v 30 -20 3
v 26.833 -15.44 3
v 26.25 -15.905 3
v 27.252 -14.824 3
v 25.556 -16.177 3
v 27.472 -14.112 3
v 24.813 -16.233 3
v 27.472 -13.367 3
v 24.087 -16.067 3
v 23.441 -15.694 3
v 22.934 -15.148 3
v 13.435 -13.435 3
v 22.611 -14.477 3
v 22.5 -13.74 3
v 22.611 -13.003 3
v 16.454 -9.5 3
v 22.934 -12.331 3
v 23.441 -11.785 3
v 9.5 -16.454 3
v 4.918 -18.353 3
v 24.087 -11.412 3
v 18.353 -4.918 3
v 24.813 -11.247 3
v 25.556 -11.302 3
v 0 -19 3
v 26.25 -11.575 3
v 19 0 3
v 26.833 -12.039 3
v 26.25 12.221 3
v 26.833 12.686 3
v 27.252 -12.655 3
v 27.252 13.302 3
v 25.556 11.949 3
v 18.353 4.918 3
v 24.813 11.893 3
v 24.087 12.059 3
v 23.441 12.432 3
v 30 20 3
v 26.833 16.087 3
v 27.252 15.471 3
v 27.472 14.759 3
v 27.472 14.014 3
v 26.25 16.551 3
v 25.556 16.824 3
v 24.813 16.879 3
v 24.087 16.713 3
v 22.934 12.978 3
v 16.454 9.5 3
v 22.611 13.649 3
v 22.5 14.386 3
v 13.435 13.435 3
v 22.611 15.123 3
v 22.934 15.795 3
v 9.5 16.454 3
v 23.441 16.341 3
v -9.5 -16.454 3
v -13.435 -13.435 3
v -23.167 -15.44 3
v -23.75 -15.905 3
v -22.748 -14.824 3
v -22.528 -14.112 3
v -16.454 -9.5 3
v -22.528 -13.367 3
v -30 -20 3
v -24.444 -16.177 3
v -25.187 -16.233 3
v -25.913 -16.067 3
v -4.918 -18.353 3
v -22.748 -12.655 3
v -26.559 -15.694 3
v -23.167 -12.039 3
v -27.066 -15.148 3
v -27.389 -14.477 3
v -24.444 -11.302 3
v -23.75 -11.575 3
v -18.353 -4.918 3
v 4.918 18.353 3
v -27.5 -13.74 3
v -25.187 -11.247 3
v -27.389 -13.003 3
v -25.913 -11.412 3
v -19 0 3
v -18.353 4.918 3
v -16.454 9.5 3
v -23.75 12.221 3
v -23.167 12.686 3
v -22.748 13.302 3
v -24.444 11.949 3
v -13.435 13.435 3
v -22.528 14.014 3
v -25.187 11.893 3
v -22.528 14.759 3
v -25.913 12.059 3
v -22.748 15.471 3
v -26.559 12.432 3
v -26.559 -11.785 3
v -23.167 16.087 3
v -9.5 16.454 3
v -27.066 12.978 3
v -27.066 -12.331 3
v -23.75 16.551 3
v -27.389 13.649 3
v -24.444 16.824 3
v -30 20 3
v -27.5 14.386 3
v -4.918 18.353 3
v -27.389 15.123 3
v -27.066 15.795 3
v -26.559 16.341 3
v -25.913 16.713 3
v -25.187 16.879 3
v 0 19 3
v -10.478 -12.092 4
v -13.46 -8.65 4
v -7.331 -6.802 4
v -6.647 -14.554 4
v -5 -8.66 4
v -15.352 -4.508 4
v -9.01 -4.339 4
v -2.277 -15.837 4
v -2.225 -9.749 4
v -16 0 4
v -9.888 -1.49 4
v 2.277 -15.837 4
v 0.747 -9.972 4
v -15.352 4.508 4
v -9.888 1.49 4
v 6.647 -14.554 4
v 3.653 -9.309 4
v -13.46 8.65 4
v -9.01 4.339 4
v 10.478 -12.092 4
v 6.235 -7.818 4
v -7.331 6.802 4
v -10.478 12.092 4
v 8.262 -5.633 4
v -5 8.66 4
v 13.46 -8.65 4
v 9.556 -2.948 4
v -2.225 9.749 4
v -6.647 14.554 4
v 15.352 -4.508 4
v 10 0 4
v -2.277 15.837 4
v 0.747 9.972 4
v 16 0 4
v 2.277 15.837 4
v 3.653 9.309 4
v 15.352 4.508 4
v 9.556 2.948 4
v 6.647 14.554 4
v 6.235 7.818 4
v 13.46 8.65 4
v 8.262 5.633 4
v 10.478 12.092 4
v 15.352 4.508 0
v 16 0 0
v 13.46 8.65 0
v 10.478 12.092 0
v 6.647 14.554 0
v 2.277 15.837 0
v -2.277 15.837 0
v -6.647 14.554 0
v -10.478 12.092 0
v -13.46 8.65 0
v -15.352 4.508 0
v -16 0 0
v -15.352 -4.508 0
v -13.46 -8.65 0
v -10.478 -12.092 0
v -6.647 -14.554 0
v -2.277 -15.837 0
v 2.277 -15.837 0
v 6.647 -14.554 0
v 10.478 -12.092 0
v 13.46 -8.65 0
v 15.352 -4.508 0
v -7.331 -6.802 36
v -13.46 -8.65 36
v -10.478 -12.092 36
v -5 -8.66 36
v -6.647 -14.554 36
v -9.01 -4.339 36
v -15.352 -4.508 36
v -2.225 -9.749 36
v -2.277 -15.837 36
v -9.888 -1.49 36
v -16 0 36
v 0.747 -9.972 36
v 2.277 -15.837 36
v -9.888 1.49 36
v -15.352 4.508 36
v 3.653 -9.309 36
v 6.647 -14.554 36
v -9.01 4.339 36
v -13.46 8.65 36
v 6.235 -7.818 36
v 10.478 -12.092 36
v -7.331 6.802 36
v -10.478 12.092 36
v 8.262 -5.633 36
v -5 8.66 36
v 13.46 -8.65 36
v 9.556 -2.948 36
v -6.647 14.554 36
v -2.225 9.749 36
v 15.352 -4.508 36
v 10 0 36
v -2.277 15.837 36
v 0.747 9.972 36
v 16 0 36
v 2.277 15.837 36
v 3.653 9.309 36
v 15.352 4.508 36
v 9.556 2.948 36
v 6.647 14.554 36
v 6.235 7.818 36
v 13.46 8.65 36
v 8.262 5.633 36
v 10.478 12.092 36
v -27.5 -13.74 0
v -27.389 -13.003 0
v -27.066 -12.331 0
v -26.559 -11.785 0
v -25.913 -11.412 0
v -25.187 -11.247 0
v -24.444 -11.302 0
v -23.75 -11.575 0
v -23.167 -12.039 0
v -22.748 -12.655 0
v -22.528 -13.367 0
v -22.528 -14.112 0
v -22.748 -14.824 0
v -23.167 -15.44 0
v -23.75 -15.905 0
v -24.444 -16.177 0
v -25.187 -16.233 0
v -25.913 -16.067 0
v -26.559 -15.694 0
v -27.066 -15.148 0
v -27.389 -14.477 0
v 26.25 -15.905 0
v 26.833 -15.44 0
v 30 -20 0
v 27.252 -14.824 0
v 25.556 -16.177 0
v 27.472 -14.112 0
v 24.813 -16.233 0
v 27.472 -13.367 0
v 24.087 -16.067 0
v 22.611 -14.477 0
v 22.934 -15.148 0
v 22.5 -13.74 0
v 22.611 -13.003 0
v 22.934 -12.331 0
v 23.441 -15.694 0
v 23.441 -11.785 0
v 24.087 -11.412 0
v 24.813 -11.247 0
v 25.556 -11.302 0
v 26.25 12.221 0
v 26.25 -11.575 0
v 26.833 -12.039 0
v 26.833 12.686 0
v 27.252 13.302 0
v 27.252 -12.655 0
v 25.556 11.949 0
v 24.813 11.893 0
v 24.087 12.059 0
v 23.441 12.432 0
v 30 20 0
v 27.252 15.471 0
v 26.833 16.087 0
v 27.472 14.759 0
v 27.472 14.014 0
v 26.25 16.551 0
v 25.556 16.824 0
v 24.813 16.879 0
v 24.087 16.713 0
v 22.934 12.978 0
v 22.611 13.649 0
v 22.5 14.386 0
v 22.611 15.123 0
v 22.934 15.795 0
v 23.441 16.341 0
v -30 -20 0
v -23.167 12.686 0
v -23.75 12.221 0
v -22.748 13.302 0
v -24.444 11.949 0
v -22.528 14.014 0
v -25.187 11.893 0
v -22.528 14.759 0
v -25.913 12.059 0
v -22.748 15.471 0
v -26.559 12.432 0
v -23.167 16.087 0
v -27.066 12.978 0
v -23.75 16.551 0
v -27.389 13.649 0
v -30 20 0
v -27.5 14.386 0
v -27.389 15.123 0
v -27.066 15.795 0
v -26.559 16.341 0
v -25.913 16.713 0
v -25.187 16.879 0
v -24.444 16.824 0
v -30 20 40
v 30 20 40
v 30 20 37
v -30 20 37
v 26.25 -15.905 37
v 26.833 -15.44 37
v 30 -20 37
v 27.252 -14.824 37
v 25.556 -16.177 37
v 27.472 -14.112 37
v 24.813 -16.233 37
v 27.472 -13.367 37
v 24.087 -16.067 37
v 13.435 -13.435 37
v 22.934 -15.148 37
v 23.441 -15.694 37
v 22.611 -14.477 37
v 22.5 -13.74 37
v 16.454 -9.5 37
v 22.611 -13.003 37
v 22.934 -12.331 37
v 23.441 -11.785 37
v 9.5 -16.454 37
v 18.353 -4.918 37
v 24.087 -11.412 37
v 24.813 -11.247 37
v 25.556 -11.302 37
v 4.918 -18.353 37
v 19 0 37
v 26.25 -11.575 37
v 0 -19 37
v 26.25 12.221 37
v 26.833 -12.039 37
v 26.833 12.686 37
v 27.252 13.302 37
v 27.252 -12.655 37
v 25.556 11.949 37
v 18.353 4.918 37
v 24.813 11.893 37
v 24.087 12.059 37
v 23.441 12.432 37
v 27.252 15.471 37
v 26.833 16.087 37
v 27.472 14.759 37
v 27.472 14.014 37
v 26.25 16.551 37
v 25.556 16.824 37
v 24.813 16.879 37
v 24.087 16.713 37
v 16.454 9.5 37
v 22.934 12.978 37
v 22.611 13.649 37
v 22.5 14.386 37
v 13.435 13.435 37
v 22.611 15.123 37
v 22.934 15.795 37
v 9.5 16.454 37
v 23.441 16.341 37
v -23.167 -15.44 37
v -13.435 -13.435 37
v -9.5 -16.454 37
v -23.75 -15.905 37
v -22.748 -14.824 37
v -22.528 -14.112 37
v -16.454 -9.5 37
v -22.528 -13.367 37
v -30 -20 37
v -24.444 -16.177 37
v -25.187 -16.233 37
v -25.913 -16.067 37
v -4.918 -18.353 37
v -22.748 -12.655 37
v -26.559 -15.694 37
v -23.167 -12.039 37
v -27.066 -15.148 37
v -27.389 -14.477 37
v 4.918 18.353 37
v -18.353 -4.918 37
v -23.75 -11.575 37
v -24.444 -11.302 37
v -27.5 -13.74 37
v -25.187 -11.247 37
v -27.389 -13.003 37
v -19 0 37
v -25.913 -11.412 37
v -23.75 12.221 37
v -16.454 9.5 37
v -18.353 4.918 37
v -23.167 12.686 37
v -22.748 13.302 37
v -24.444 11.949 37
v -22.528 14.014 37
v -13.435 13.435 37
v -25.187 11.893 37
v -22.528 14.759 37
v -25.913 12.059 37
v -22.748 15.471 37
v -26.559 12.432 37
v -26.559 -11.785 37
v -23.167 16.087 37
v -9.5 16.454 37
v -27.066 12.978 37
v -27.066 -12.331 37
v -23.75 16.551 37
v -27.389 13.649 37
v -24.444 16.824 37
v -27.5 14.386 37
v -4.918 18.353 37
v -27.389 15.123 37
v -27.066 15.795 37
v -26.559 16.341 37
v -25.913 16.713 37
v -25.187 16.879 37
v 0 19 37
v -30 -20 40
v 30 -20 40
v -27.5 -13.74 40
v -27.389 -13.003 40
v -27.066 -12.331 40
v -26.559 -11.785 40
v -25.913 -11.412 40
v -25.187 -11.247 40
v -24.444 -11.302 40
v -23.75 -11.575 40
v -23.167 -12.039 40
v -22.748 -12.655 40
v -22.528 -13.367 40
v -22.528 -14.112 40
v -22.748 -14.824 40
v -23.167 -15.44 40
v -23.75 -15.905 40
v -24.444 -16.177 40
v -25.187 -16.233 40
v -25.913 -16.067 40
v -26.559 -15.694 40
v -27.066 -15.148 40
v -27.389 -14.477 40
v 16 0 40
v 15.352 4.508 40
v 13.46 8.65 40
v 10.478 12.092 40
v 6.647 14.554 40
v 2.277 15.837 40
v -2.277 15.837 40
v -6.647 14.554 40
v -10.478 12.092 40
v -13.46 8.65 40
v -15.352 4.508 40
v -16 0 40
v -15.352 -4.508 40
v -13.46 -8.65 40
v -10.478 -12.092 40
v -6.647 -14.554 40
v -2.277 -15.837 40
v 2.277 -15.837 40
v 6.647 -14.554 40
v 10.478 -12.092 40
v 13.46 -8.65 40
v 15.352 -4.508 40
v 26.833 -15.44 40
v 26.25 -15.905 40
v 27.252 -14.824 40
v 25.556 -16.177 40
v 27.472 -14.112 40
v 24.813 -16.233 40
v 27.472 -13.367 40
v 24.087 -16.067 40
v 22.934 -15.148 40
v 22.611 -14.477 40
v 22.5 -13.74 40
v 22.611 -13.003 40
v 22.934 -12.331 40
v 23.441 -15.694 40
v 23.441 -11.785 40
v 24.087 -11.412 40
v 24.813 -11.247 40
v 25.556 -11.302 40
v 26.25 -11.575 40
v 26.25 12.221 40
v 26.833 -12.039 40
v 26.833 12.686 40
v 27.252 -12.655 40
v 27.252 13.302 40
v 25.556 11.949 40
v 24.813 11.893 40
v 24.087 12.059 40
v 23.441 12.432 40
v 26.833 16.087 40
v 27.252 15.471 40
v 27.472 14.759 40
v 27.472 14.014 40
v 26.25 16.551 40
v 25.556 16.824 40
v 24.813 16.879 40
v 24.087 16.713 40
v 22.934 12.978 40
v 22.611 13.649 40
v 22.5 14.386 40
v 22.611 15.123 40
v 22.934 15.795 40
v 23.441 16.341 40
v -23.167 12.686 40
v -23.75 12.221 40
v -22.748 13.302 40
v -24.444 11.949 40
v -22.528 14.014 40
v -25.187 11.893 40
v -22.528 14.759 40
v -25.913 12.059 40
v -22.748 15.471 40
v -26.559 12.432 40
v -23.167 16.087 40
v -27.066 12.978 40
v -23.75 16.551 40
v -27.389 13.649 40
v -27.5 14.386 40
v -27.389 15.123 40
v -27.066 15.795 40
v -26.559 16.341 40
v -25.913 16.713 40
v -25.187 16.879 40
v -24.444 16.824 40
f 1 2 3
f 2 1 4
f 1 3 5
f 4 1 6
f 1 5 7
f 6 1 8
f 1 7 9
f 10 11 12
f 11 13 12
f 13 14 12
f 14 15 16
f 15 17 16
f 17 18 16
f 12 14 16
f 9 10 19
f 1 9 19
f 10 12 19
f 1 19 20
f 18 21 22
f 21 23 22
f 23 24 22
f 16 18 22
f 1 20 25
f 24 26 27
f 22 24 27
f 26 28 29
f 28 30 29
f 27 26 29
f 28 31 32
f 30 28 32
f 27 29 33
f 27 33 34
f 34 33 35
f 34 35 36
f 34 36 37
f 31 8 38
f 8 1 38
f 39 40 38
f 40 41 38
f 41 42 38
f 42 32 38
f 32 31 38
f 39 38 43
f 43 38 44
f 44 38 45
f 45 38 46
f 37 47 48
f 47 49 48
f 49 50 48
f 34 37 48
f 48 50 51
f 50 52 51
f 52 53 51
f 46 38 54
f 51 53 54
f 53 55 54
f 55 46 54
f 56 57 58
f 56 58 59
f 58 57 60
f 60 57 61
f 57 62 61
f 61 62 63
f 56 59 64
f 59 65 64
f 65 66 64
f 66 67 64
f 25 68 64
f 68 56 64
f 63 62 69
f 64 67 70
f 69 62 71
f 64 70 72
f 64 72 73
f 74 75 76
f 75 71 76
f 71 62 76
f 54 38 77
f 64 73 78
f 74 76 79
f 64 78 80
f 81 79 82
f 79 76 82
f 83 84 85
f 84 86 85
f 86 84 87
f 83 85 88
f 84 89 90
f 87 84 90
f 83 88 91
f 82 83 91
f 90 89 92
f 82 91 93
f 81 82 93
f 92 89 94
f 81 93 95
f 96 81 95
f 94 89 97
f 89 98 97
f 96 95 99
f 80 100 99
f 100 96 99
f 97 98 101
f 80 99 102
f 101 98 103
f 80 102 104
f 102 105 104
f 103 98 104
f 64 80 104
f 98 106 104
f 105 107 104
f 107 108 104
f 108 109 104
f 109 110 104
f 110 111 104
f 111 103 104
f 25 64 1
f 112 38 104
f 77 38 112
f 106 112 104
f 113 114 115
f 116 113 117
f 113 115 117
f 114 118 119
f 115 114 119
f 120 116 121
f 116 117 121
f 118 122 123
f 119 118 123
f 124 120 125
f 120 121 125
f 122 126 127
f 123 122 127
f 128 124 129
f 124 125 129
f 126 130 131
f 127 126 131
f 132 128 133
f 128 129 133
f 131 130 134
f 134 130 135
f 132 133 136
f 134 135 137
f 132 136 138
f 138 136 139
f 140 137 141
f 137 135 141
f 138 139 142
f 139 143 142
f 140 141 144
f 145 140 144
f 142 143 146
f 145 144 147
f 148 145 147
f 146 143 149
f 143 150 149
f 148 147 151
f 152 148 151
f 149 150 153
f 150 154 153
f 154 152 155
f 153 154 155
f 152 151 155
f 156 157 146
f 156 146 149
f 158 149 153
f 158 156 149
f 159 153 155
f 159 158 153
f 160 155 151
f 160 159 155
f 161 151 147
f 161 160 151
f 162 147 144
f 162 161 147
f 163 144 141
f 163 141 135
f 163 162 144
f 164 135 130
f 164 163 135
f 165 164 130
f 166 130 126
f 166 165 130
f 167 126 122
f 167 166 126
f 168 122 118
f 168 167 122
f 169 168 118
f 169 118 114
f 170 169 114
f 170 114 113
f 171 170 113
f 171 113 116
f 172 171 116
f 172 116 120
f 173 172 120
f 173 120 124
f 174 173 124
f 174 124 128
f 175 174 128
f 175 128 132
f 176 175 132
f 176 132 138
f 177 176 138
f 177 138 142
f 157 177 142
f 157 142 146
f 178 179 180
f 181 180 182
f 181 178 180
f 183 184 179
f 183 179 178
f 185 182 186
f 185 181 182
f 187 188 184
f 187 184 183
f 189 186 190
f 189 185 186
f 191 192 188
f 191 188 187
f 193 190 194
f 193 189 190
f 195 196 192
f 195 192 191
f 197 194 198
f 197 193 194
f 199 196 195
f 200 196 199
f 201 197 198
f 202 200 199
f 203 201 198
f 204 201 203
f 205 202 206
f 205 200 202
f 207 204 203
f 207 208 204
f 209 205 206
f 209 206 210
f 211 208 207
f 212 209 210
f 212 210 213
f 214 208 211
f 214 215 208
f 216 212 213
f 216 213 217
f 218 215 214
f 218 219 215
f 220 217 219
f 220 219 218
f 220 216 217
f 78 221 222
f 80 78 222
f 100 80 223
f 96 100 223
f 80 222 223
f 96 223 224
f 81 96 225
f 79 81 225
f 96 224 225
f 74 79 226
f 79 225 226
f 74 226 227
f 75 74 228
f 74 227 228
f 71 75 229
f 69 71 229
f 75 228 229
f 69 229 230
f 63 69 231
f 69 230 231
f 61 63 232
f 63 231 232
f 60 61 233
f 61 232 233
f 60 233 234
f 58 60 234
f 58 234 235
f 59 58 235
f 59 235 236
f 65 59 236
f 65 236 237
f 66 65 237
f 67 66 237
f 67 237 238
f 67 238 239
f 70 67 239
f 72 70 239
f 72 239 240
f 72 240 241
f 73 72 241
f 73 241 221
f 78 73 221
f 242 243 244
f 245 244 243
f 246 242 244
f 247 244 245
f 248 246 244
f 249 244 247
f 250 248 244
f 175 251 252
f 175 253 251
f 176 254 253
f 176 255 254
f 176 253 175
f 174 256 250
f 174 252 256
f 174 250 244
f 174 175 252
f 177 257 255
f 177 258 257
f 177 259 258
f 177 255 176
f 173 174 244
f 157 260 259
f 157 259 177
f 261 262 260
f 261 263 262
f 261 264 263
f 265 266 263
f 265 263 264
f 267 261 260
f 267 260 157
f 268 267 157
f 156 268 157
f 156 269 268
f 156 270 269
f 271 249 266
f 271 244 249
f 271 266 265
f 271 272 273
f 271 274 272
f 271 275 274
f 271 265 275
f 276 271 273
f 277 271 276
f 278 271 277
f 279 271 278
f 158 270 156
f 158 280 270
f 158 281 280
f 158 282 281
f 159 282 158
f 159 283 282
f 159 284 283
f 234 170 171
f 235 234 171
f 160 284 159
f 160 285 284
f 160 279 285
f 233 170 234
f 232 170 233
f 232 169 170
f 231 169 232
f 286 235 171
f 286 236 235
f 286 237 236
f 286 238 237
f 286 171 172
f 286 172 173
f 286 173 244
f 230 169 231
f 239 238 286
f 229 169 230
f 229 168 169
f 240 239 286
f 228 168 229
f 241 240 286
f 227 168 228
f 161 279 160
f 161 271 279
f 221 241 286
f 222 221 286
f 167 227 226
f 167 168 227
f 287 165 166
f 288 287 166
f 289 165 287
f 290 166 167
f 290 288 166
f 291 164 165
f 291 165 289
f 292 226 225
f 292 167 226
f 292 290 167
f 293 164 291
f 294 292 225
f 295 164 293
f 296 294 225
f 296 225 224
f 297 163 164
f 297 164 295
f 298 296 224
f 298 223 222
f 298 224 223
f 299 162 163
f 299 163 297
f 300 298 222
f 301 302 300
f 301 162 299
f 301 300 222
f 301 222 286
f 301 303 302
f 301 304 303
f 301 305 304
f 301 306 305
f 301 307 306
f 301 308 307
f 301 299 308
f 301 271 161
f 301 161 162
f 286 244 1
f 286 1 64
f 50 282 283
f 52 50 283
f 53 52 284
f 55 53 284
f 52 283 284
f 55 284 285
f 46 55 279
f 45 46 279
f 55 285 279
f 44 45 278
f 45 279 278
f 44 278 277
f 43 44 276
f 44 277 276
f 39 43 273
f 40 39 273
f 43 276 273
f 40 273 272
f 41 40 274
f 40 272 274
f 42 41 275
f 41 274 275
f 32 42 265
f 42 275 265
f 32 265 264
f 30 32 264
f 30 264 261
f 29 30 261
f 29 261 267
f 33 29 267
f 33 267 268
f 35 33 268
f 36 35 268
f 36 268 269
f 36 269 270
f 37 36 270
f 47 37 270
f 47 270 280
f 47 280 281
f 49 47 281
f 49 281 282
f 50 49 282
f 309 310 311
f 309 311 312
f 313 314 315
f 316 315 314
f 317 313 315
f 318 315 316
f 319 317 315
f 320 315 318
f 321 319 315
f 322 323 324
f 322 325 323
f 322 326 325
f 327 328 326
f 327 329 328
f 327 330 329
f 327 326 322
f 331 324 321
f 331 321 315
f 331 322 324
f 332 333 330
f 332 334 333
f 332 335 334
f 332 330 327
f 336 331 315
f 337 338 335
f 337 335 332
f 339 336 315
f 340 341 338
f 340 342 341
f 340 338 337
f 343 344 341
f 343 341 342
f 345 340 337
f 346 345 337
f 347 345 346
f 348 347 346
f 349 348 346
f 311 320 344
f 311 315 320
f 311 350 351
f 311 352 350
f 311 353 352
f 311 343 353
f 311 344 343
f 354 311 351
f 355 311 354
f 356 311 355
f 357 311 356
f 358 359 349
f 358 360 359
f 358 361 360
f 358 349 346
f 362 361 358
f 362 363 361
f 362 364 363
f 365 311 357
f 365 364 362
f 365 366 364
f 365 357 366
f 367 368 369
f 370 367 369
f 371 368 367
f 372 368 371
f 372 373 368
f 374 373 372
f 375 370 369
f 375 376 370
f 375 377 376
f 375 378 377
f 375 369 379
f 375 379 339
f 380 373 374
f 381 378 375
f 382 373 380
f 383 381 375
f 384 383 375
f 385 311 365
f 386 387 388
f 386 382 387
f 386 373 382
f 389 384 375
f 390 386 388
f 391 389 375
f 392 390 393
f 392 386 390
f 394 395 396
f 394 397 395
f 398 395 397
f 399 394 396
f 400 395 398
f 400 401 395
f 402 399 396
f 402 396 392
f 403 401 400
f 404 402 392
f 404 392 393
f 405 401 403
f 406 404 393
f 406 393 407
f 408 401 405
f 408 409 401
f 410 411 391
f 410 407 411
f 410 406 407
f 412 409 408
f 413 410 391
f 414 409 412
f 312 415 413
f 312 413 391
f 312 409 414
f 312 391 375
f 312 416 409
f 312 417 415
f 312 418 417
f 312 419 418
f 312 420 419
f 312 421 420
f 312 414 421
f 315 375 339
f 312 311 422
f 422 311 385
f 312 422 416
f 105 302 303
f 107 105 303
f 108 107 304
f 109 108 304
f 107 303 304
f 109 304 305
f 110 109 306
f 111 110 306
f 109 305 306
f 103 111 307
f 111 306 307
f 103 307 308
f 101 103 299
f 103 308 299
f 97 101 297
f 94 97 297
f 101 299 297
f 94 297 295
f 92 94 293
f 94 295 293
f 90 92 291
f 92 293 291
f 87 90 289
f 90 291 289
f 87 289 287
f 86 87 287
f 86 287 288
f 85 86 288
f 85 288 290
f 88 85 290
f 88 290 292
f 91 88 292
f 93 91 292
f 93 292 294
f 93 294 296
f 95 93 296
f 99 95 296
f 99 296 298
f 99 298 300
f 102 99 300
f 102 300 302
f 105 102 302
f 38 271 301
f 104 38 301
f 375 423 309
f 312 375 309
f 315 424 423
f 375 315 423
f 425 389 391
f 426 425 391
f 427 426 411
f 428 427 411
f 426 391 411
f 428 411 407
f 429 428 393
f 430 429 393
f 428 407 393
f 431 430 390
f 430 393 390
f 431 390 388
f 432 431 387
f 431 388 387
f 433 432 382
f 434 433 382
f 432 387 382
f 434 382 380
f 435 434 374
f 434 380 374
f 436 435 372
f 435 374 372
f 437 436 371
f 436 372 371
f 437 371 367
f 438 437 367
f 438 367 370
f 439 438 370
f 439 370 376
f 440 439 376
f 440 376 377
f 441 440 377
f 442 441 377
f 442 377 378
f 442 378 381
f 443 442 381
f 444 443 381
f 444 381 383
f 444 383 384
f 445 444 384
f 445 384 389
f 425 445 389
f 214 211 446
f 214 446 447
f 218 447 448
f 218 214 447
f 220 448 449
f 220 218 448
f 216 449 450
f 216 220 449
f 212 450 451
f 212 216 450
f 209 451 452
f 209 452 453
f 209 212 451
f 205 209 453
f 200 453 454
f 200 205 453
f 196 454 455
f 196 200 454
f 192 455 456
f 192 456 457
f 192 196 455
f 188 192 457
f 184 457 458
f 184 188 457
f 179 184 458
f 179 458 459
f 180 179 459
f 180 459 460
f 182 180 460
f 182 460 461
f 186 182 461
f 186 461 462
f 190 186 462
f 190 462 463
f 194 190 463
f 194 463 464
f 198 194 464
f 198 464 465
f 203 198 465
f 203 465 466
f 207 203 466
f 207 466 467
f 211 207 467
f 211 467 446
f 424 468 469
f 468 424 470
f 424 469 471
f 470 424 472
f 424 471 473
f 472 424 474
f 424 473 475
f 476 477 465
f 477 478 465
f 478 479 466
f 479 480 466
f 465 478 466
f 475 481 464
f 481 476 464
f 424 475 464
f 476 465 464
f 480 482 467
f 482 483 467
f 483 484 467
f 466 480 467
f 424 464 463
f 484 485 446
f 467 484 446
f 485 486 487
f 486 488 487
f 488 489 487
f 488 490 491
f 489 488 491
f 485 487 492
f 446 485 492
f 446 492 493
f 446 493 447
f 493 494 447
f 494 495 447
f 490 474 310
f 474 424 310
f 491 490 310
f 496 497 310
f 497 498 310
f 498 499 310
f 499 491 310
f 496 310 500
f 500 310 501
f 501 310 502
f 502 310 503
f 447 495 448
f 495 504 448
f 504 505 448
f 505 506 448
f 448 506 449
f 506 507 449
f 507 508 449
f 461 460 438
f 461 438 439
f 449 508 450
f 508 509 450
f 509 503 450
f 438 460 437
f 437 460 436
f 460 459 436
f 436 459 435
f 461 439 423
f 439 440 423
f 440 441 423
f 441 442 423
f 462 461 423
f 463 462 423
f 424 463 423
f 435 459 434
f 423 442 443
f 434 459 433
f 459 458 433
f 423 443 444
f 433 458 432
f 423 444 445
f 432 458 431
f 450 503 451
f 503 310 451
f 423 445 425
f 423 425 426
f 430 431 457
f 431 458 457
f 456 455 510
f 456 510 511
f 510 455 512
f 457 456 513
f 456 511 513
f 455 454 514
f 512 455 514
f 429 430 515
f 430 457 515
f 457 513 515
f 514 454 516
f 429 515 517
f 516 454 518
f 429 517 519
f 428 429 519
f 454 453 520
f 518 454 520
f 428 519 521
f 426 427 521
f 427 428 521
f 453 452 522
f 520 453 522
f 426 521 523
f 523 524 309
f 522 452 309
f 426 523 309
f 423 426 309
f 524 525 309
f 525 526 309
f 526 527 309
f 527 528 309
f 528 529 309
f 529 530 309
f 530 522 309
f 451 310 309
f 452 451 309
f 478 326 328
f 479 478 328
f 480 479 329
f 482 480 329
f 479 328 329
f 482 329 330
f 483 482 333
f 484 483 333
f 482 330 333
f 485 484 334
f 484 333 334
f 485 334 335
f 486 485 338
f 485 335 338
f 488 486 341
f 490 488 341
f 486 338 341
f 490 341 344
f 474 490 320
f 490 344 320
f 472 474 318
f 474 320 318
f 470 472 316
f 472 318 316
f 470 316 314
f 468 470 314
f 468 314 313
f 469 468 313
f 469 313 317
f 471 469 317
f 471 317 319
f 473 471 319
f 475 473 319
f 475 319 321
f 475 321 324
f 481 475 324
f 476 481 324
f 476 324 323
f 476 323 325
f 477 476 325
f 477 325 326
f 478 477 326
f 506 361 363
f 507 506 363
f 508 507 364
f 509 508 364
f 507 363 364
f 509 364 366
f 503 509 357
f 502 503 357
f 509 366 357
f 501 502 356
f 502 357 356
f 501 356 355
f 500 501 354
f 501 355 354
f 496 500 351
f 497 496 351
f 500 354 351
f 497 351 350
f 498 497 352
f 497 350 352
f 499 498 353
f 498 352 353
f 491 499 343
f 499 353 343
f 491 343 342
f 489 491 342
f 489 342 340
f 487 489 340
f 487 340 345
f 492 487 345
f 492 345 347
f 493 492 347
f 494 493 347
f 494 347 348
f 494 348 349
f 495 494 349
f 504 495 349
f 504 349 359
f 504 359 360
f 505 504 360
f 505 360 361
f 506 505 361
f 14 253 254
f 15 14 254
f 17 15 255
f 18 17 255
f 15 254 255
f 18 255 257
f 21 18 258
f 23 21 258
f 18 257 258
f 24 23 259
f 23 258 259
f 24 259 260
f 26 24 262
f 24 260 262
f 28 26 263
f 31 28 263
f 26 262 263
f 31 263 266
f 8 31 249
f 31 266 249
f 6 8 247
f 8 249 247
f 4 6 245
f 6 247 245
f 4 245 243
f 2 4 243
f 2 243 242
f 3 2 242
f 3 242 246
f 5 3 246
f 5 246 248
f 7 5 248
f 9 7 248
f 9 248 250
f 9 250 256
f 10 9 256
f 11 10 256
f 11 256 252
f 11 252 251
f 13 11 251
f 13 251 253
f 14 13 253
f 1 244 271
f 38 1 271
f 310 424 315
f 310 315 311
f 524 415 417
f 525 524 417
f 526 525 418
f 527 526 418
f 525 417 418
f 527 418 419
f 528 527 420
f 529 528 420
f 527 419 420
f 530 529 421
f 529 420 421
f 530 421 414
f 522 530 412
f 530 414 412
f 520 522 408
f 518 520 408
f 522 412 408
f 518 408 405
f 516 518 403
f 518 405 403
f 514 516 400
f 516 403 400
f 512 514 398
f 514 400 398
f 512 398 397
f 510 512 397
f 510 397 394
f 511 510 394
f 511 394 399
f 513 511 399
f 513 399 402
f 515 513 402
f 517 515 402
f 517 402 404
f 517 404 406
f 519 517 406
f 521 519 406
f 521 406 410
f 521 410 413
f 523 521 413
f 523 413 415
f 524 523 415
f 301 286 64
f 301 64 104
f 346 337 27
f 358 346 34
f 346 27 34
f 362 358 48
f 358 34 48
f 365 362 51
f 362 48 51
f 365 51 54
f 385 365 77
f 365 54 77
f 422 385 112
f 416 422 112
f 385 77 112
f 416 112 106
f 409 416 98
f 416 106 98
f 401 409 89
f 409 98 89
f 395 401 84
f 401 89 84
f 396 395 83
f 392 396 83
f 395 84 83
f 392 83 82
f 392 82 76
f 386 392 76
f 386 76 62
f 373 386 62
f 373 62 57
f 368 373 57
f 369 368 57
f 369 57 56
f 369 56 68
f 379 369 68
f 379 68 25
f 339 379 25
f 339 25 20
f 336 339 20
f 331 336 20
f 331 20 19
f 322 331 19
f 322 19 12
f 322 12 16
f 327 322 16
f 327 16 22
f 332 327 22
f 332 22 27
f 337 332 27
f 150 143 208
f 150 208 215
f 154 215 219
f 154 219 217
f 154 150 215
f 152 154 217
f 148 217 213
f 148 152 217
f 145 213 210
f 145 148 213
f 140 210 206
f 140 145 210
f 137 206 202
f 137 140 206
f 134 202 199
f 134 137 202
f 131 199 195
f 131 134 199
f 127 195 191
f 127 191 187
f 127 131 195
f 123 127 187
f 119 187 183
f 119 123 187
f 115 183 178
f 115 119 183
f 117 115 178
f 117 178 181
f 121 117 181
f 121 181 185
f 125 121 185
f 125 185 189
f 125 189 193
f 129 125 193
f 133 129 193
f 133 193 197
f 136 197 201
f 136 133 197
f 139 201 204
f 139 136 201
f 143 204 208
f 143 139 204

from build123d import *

# Parameters (mm, degrees)
SKETCH1_R                = 19
SKETCH1_R_2              = 16
BOSS_EXTRUDE1_DEPTH      = 40
SKETCH2_W                = 60
SKETCH2_H                = 40
SKETCH2_R                = 19
BOSS_EXTRUDE2_DEPTH      = 3
SKETCH4_R                = 2.5
CUT_EXTRUDE1_DEPTH       = 54.851648071
BOSS_EXTRUDE3_DEPTH      = 16
BOSS_EXTRUDE3_DEPTH_BACK = 16
SKETCH6_R                = 16
SKETCH6_R_2              = 10


with BuildPart() as part:
    # Sketch1 → Boss-Extrude1 (new body)
    with BuildSketch(Plane.XY):
        Circle(SKETCH1_R)
        Circle(SKETCH1_R_2, mode=Mode.SUBTRACT)
    extrude(amount=BOSS_EXTRUDE1_DEPTH)

    # Sketch2 → Boss-Extrude2 (add)
    with BuildSketch(Plane(origin=(0, 0, 0), x_dir=(-1, 0, 0), z_dir=(0, 0, -1))):
        Rectangle(SKETCH2_W, SKETCH2_H)
        Circle(SKETCH2_R, mode=Mode.SUBTRACT)
    boss_extrude2 = extrude(amount=-BOSS_EXTRUDE2_DEPTH)

    # Mirror1: Boss-Extrude2 across plane
    add(boss_extrude2.mirror(Plane.XY.offset(20)))

    # Sketch4 → Cut-Extrude1 (cut, through all)
    with BuildSketch(Plane(origin=(0, 0, 0), x_dir=(-1, 0, 0), z_dir=(0, 0, -1))):
        with Locations((-25, 14.38623609)):
            Circle(SKETCH4_R)
        with Locations((25, 14.38623609)):
            Circle(SKETCH4_R)
        with Locations((-25, -13.739663681)):
            Circle(SKETCH4_R)
        with Locations((25, -13.739663681)):
            Circle(SKETCH4_R)
    extrude(amount=-CUT_EXTRUDE1_DEPTH, mode=Mode.SUBTRACT)

    # Sketch6 → Boss-Extrude3 (add, two sides: drawn at the far end of the back side and taken through both)
    with BuildSketch(Plane.XY.offset(20).offset(-BOSS_EXTRUDE3_DEPTH_BACK)):
        Circle(SKETCH6_R)
        Circle(SKETCH6_R_2, mode=Mode.SUBTRACT)
    extrude(amount=BOSS_EXTRUDE3_DEPTH + BOSS_EXTRUDE3_DEPTH_BACK)


solid = part.part
